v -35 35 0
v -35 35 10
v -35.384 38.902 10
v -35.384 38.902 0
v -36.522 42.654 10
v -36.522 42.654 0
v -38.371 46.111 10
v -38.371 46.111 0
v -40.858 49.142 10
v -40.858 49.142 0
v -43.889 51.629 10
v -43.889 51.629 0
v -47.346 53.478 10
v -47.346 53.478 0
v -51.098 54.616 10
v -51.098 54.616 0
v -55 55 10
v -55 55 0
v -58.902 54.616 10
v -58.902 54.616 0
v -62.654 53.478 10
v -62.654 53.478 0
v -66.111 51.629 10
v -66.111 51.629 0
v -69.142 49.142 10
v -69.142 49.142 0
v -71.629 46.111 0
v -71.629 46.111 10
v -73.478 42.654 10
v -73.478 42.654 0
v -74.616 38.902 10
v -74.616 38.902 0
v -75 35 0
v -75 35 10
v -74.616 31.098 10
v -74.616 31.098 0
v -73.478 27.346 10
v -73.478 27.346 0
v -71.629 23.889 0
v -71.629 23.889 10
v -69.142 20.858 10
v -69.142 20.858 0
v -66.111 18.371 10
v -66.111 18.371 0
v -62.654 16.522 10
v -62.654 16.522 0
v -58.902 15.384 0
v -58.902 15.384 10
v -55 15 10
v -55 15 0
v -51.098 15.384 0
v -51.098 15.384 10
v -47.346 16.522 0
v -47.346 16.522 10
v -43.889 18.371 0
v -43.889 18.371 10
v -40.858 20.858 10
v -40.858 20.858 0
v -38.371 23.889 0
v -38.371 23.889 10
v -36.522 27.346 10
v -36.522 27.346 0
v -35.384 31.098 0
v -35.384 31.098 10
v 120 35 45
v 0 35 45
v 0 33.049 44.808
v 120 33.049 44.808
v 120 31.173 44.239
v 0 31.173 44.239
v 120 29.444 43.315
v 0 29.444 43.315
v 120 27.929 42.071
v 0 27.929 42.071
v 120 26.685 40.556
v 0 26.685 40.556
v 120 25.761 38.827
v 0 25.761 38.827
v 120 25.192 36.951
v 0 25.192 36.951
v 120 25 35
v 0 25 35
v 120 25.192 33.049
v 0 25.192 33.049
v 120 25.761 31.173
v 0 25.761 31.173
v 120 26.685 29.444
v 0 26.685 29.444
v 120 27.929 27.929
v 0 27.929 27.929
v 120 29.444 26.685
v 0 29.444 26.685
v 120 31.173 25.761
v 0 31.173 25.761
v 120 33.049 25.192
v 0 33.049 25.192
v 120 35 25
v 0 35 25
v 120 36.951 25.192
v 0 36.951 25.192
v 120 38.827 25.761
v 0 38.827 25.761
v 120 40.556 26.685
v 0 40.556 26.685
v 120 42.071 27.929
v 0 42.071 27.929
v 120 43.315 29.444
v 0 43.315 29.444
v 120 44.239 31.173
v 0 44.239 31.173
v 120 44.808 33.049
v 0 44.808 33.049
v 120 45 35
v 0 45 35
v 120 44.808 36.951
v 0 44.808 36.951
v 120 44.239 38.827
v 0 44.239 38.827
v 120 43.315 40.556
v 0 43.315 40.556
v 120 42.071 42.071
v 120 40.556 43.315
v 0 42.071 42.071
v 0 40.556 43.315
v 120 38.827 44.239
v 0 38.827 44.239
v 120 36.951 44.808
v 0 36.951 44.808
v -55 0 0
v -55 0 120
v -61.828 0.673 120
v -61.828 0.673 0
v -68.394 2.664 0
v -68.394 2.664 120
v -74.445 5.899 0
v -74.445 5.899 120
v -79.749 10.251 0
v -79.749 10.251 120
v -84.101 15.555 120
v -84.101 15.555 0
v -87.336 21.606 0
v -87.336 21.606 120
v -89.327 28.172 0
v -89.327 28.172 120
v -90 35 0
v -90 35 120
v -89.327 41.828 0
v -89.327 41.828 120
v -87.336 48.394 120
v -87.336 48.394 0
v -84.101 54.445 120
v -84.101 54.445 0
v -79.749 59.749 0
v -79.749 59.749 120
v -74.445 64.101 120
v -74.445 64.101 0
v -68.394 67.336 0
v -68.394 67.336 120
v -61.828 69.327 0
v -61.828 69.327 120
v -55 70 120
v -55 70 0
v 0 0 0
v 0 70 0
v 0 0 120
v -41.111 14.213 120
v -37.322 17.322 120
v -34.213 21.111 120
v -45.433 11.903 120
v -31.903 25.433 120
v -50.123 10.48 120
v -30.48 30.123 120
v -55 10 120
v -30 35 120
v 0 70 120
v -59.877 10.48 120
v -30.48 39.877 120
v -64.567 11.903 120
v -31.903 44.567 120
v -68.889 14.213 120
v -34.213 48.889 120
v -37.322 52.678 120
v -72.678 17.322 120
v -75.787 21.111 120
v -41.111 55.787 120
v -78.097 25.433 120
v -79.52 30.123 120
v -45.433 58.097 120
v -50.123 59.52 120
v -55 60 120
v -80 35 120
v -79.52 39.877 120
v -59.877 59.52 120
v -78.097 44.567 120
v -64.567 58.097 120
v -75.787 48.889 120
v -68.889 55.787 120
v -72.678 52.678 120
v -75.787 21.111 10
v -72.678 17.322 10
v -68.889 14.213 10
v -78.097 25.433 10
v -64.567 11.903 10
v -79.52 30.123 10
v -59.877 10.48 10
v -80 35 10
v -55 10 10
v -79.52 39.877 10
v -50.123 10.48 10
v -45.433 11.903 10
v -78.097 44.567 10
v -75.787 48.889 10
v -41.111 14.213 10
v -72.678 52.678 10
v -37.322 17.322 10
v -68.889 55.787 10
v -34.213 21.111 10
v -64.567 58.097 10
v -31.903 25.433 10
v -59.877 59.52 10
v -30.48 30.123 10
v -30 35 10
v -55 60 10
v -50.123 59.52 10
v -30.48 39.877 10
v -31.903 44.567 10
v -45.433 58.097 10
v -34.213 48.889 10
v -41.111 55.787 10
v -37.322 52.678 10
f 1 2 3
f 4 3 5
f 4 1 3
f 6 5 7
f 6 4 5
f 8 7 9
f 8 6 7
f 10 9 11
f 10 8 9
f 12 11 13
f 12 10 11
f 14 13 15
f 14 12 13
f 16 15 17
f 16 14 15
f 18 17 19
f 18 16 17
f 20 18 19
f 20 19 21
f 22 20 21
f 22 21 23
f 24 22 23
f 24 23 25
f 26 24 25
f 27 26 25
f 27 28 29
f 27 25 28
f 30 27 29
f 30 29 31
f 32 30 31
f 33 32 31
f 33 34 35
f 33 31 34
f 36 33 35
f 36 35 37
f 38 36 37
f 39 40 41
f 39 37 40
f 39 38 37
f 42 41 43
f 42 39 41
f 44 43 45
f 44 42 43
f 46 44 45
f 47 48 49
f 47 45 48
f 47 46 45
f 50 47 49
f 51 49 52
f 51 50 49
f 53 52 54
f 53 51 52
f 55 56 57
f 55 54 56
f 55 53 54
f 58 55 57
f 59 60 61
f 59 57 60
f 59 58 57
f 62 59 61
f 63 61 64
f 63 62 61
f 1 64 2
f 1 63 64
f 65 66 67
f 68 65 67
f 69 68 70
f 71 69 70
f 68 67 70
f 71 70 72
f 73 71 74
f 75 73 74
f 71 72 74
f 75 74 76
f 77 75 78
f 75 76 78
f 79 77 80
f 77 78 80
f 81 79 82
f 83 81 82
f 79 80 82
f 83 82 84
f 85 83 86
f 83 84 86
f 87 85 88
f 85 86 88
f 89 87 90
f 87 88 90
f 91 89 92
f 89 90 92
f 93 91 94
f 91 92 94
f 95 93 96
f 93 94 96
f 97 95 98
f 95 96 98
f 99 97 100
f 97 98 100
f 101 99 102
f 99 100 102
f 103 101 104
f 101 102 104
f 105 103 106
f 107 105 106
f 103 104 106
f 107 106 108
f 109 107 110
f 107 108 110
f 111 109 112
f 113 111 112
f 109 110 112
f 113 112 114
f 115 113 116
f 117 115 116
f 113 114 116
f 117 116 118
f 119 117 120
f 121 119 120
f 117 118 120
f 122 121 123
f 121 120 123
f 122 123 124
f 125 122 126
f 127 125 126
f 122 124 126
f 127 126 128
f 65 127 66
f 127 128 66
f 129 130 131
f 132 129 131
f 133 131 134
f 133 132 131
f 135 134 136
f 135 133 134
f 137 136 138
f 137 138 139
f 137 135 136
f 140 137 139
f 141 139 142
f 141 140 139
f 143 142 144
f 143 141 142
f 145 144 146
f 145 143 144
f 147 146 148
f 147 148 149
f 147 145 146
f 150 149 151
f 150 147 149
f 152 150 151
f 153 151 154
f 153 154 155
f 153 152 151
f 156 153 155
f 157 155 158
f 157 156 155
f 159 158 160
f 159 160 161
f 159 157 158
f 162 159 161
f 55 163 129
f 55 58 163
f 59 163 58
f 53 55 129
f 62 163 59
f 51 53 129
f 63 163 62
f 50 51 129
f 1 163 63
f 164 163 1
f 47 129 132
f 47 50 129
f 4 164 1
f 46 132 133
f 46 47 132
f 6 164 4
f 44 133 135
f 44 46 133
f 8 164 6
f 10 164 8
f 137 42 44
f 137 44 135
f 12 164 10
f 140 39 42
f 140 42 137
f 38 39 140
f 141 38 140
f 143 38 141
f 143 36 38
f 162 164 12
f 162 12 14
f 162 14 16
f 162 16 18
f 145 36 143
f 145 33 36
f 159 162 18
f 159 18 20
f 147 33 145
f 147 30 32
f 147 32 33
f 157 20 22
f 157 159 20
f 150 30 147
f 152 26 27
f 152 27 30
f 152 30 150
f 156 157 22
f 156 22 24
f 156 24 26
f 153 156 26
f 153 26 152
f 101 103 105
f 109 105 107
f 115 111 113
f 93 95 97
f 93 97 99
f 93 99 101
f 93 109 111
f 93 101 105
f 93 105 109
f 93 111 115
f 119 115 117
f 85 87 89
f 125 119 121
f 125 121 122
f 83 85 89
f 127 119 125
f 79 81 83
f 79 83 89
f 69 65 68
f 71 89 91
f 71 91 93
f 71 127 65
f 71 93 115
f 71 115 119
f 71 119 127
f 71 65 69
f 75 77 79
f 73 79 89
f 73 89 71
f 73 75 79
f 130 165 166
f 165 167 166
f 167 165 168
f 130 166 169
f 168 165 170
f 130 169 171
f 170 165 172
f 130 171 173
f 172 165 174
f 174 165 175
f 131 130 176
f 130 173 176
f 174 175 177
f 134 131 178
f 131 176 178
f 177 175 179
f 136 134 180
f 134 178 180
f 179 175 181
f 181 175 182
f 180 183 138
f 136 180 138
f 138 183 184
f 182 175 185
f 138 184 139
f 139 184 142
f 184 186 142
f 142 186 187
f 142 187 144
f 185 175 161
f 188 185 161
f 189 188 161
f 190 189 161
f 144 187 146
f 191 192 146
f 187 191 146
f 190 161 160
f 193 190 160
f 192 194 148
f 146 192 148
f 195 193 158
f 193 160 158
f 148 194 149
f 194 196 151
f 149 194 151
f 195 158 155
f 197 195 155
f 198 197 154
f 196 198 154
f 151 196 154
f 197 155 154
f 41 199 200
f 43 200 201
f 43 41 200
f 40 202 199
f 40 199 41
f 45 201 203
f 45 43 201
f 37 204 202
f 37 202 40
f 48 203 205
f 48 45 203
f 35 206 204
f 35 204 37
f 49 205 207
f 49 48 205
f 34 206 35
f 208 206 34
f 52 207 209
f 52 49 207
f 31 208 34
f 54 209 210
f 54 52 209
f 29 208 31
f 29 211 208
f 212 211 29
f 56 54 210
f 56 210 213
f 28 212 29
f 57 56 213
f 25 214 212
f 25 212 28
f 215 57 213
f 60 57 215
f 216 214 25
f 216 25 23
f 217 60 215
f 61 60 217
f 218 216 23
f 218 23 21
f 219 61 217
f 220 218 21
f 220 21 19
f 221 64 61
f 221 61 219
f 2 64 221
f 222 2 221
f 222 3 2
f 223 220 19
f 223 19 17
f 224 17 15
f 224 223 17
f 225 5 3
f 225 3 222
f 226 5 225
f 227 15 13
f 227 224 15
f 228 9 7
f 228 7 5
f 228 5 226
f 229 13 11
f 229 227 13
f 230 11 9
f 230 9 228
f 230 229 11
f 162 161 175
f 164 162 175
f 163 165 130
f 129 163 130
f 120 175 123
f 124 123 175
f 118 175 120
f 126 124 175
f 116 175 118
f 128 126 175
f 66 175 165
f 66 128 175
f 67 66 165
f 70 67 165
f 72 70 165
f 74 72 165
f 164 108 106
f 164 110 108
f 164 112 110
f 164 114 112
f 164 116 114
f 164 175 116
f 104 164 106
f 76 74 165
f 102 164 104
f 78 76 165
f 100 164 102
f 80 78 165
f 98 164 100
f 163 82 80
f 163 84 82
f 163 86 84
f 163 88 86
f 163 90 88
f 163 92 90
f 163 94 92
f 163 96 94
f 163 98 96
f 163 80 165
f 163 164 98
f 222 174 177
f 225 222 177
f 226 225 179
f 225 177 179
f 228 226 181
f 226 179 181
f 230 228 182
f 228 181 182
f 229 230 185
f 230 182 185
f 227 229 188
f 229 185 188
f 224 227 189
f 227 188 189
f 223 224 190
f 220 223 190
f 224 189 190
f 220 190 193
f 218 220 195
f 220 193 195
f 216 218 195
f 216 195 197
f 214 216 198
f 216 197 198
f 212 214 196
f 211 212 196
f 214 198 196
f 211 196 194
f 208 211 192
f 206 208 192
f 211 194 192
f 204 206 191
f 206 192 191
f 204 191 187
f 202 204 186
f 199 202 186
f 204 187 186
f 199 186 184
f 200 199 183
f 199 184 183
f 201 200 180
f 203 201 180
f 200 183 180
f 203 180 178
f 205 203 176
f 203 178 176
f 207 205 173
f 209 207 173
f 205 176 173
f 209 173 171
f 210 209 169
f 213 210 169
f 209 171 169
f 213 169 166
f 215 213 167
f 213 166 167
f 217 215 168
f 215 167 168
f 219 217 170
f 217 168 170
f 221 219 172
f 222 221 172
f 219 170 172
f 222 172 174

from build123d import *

# Parameters (mm, degrees)
SKETCH1_R           = 20
BOSS_EXTRUDE1_DEPTH = 120
SKETCH2_R           = 25
CUT_EXTRUDE1_DEPTH  = 110
SKETCH3_R           = 10
BOSS_EXTRUDE2_DEPTH = 120


with BuildPart() as part:
    # Sketch1 → Boss-Extrude1 (new body)
    with BuildSketch(Plane.XY):
        with BuildLine():
            Line((0, 0), (-55, 0))
            ThreePointArc((-55, 0), (-90, 35), (-55, 70))
            Line((-55, 70), (0, 70))
            Line((0, 70), (0, 0))
        make_face()
        with Locations((-55, 35)):
            Circle(SKETCH1_R, mode=Mode.SUBTRACT)
    extrude(amount=BOSS_EXTRUDE1_DEPTH)

    # Sketch2 → Cut-Extrude1 (cut)
    with BuildSketch(Plane.XY.offset(120)):
        with Locations((-55, 35)):
            Circle(SKETCH2_R)
    extrude(amount=-CUT_EXTRUDE1_DEPTH, mode=Mode.SUBTRACT)

    # Sketch3 → Boss-Extrude2 (add)
    with BuildSketch(Plane(origin=(0, 0, 0), x_dir=(0, 0, -1), z_dir=(1, 0, 0))):
        with Locations(Location((-35, 35, 0), (0, 0, 180))):
            Circle(SKETCH3_R)
    extrude(amount=BOSS_EXTRUDE2_DEPTH)


solid = part.part
